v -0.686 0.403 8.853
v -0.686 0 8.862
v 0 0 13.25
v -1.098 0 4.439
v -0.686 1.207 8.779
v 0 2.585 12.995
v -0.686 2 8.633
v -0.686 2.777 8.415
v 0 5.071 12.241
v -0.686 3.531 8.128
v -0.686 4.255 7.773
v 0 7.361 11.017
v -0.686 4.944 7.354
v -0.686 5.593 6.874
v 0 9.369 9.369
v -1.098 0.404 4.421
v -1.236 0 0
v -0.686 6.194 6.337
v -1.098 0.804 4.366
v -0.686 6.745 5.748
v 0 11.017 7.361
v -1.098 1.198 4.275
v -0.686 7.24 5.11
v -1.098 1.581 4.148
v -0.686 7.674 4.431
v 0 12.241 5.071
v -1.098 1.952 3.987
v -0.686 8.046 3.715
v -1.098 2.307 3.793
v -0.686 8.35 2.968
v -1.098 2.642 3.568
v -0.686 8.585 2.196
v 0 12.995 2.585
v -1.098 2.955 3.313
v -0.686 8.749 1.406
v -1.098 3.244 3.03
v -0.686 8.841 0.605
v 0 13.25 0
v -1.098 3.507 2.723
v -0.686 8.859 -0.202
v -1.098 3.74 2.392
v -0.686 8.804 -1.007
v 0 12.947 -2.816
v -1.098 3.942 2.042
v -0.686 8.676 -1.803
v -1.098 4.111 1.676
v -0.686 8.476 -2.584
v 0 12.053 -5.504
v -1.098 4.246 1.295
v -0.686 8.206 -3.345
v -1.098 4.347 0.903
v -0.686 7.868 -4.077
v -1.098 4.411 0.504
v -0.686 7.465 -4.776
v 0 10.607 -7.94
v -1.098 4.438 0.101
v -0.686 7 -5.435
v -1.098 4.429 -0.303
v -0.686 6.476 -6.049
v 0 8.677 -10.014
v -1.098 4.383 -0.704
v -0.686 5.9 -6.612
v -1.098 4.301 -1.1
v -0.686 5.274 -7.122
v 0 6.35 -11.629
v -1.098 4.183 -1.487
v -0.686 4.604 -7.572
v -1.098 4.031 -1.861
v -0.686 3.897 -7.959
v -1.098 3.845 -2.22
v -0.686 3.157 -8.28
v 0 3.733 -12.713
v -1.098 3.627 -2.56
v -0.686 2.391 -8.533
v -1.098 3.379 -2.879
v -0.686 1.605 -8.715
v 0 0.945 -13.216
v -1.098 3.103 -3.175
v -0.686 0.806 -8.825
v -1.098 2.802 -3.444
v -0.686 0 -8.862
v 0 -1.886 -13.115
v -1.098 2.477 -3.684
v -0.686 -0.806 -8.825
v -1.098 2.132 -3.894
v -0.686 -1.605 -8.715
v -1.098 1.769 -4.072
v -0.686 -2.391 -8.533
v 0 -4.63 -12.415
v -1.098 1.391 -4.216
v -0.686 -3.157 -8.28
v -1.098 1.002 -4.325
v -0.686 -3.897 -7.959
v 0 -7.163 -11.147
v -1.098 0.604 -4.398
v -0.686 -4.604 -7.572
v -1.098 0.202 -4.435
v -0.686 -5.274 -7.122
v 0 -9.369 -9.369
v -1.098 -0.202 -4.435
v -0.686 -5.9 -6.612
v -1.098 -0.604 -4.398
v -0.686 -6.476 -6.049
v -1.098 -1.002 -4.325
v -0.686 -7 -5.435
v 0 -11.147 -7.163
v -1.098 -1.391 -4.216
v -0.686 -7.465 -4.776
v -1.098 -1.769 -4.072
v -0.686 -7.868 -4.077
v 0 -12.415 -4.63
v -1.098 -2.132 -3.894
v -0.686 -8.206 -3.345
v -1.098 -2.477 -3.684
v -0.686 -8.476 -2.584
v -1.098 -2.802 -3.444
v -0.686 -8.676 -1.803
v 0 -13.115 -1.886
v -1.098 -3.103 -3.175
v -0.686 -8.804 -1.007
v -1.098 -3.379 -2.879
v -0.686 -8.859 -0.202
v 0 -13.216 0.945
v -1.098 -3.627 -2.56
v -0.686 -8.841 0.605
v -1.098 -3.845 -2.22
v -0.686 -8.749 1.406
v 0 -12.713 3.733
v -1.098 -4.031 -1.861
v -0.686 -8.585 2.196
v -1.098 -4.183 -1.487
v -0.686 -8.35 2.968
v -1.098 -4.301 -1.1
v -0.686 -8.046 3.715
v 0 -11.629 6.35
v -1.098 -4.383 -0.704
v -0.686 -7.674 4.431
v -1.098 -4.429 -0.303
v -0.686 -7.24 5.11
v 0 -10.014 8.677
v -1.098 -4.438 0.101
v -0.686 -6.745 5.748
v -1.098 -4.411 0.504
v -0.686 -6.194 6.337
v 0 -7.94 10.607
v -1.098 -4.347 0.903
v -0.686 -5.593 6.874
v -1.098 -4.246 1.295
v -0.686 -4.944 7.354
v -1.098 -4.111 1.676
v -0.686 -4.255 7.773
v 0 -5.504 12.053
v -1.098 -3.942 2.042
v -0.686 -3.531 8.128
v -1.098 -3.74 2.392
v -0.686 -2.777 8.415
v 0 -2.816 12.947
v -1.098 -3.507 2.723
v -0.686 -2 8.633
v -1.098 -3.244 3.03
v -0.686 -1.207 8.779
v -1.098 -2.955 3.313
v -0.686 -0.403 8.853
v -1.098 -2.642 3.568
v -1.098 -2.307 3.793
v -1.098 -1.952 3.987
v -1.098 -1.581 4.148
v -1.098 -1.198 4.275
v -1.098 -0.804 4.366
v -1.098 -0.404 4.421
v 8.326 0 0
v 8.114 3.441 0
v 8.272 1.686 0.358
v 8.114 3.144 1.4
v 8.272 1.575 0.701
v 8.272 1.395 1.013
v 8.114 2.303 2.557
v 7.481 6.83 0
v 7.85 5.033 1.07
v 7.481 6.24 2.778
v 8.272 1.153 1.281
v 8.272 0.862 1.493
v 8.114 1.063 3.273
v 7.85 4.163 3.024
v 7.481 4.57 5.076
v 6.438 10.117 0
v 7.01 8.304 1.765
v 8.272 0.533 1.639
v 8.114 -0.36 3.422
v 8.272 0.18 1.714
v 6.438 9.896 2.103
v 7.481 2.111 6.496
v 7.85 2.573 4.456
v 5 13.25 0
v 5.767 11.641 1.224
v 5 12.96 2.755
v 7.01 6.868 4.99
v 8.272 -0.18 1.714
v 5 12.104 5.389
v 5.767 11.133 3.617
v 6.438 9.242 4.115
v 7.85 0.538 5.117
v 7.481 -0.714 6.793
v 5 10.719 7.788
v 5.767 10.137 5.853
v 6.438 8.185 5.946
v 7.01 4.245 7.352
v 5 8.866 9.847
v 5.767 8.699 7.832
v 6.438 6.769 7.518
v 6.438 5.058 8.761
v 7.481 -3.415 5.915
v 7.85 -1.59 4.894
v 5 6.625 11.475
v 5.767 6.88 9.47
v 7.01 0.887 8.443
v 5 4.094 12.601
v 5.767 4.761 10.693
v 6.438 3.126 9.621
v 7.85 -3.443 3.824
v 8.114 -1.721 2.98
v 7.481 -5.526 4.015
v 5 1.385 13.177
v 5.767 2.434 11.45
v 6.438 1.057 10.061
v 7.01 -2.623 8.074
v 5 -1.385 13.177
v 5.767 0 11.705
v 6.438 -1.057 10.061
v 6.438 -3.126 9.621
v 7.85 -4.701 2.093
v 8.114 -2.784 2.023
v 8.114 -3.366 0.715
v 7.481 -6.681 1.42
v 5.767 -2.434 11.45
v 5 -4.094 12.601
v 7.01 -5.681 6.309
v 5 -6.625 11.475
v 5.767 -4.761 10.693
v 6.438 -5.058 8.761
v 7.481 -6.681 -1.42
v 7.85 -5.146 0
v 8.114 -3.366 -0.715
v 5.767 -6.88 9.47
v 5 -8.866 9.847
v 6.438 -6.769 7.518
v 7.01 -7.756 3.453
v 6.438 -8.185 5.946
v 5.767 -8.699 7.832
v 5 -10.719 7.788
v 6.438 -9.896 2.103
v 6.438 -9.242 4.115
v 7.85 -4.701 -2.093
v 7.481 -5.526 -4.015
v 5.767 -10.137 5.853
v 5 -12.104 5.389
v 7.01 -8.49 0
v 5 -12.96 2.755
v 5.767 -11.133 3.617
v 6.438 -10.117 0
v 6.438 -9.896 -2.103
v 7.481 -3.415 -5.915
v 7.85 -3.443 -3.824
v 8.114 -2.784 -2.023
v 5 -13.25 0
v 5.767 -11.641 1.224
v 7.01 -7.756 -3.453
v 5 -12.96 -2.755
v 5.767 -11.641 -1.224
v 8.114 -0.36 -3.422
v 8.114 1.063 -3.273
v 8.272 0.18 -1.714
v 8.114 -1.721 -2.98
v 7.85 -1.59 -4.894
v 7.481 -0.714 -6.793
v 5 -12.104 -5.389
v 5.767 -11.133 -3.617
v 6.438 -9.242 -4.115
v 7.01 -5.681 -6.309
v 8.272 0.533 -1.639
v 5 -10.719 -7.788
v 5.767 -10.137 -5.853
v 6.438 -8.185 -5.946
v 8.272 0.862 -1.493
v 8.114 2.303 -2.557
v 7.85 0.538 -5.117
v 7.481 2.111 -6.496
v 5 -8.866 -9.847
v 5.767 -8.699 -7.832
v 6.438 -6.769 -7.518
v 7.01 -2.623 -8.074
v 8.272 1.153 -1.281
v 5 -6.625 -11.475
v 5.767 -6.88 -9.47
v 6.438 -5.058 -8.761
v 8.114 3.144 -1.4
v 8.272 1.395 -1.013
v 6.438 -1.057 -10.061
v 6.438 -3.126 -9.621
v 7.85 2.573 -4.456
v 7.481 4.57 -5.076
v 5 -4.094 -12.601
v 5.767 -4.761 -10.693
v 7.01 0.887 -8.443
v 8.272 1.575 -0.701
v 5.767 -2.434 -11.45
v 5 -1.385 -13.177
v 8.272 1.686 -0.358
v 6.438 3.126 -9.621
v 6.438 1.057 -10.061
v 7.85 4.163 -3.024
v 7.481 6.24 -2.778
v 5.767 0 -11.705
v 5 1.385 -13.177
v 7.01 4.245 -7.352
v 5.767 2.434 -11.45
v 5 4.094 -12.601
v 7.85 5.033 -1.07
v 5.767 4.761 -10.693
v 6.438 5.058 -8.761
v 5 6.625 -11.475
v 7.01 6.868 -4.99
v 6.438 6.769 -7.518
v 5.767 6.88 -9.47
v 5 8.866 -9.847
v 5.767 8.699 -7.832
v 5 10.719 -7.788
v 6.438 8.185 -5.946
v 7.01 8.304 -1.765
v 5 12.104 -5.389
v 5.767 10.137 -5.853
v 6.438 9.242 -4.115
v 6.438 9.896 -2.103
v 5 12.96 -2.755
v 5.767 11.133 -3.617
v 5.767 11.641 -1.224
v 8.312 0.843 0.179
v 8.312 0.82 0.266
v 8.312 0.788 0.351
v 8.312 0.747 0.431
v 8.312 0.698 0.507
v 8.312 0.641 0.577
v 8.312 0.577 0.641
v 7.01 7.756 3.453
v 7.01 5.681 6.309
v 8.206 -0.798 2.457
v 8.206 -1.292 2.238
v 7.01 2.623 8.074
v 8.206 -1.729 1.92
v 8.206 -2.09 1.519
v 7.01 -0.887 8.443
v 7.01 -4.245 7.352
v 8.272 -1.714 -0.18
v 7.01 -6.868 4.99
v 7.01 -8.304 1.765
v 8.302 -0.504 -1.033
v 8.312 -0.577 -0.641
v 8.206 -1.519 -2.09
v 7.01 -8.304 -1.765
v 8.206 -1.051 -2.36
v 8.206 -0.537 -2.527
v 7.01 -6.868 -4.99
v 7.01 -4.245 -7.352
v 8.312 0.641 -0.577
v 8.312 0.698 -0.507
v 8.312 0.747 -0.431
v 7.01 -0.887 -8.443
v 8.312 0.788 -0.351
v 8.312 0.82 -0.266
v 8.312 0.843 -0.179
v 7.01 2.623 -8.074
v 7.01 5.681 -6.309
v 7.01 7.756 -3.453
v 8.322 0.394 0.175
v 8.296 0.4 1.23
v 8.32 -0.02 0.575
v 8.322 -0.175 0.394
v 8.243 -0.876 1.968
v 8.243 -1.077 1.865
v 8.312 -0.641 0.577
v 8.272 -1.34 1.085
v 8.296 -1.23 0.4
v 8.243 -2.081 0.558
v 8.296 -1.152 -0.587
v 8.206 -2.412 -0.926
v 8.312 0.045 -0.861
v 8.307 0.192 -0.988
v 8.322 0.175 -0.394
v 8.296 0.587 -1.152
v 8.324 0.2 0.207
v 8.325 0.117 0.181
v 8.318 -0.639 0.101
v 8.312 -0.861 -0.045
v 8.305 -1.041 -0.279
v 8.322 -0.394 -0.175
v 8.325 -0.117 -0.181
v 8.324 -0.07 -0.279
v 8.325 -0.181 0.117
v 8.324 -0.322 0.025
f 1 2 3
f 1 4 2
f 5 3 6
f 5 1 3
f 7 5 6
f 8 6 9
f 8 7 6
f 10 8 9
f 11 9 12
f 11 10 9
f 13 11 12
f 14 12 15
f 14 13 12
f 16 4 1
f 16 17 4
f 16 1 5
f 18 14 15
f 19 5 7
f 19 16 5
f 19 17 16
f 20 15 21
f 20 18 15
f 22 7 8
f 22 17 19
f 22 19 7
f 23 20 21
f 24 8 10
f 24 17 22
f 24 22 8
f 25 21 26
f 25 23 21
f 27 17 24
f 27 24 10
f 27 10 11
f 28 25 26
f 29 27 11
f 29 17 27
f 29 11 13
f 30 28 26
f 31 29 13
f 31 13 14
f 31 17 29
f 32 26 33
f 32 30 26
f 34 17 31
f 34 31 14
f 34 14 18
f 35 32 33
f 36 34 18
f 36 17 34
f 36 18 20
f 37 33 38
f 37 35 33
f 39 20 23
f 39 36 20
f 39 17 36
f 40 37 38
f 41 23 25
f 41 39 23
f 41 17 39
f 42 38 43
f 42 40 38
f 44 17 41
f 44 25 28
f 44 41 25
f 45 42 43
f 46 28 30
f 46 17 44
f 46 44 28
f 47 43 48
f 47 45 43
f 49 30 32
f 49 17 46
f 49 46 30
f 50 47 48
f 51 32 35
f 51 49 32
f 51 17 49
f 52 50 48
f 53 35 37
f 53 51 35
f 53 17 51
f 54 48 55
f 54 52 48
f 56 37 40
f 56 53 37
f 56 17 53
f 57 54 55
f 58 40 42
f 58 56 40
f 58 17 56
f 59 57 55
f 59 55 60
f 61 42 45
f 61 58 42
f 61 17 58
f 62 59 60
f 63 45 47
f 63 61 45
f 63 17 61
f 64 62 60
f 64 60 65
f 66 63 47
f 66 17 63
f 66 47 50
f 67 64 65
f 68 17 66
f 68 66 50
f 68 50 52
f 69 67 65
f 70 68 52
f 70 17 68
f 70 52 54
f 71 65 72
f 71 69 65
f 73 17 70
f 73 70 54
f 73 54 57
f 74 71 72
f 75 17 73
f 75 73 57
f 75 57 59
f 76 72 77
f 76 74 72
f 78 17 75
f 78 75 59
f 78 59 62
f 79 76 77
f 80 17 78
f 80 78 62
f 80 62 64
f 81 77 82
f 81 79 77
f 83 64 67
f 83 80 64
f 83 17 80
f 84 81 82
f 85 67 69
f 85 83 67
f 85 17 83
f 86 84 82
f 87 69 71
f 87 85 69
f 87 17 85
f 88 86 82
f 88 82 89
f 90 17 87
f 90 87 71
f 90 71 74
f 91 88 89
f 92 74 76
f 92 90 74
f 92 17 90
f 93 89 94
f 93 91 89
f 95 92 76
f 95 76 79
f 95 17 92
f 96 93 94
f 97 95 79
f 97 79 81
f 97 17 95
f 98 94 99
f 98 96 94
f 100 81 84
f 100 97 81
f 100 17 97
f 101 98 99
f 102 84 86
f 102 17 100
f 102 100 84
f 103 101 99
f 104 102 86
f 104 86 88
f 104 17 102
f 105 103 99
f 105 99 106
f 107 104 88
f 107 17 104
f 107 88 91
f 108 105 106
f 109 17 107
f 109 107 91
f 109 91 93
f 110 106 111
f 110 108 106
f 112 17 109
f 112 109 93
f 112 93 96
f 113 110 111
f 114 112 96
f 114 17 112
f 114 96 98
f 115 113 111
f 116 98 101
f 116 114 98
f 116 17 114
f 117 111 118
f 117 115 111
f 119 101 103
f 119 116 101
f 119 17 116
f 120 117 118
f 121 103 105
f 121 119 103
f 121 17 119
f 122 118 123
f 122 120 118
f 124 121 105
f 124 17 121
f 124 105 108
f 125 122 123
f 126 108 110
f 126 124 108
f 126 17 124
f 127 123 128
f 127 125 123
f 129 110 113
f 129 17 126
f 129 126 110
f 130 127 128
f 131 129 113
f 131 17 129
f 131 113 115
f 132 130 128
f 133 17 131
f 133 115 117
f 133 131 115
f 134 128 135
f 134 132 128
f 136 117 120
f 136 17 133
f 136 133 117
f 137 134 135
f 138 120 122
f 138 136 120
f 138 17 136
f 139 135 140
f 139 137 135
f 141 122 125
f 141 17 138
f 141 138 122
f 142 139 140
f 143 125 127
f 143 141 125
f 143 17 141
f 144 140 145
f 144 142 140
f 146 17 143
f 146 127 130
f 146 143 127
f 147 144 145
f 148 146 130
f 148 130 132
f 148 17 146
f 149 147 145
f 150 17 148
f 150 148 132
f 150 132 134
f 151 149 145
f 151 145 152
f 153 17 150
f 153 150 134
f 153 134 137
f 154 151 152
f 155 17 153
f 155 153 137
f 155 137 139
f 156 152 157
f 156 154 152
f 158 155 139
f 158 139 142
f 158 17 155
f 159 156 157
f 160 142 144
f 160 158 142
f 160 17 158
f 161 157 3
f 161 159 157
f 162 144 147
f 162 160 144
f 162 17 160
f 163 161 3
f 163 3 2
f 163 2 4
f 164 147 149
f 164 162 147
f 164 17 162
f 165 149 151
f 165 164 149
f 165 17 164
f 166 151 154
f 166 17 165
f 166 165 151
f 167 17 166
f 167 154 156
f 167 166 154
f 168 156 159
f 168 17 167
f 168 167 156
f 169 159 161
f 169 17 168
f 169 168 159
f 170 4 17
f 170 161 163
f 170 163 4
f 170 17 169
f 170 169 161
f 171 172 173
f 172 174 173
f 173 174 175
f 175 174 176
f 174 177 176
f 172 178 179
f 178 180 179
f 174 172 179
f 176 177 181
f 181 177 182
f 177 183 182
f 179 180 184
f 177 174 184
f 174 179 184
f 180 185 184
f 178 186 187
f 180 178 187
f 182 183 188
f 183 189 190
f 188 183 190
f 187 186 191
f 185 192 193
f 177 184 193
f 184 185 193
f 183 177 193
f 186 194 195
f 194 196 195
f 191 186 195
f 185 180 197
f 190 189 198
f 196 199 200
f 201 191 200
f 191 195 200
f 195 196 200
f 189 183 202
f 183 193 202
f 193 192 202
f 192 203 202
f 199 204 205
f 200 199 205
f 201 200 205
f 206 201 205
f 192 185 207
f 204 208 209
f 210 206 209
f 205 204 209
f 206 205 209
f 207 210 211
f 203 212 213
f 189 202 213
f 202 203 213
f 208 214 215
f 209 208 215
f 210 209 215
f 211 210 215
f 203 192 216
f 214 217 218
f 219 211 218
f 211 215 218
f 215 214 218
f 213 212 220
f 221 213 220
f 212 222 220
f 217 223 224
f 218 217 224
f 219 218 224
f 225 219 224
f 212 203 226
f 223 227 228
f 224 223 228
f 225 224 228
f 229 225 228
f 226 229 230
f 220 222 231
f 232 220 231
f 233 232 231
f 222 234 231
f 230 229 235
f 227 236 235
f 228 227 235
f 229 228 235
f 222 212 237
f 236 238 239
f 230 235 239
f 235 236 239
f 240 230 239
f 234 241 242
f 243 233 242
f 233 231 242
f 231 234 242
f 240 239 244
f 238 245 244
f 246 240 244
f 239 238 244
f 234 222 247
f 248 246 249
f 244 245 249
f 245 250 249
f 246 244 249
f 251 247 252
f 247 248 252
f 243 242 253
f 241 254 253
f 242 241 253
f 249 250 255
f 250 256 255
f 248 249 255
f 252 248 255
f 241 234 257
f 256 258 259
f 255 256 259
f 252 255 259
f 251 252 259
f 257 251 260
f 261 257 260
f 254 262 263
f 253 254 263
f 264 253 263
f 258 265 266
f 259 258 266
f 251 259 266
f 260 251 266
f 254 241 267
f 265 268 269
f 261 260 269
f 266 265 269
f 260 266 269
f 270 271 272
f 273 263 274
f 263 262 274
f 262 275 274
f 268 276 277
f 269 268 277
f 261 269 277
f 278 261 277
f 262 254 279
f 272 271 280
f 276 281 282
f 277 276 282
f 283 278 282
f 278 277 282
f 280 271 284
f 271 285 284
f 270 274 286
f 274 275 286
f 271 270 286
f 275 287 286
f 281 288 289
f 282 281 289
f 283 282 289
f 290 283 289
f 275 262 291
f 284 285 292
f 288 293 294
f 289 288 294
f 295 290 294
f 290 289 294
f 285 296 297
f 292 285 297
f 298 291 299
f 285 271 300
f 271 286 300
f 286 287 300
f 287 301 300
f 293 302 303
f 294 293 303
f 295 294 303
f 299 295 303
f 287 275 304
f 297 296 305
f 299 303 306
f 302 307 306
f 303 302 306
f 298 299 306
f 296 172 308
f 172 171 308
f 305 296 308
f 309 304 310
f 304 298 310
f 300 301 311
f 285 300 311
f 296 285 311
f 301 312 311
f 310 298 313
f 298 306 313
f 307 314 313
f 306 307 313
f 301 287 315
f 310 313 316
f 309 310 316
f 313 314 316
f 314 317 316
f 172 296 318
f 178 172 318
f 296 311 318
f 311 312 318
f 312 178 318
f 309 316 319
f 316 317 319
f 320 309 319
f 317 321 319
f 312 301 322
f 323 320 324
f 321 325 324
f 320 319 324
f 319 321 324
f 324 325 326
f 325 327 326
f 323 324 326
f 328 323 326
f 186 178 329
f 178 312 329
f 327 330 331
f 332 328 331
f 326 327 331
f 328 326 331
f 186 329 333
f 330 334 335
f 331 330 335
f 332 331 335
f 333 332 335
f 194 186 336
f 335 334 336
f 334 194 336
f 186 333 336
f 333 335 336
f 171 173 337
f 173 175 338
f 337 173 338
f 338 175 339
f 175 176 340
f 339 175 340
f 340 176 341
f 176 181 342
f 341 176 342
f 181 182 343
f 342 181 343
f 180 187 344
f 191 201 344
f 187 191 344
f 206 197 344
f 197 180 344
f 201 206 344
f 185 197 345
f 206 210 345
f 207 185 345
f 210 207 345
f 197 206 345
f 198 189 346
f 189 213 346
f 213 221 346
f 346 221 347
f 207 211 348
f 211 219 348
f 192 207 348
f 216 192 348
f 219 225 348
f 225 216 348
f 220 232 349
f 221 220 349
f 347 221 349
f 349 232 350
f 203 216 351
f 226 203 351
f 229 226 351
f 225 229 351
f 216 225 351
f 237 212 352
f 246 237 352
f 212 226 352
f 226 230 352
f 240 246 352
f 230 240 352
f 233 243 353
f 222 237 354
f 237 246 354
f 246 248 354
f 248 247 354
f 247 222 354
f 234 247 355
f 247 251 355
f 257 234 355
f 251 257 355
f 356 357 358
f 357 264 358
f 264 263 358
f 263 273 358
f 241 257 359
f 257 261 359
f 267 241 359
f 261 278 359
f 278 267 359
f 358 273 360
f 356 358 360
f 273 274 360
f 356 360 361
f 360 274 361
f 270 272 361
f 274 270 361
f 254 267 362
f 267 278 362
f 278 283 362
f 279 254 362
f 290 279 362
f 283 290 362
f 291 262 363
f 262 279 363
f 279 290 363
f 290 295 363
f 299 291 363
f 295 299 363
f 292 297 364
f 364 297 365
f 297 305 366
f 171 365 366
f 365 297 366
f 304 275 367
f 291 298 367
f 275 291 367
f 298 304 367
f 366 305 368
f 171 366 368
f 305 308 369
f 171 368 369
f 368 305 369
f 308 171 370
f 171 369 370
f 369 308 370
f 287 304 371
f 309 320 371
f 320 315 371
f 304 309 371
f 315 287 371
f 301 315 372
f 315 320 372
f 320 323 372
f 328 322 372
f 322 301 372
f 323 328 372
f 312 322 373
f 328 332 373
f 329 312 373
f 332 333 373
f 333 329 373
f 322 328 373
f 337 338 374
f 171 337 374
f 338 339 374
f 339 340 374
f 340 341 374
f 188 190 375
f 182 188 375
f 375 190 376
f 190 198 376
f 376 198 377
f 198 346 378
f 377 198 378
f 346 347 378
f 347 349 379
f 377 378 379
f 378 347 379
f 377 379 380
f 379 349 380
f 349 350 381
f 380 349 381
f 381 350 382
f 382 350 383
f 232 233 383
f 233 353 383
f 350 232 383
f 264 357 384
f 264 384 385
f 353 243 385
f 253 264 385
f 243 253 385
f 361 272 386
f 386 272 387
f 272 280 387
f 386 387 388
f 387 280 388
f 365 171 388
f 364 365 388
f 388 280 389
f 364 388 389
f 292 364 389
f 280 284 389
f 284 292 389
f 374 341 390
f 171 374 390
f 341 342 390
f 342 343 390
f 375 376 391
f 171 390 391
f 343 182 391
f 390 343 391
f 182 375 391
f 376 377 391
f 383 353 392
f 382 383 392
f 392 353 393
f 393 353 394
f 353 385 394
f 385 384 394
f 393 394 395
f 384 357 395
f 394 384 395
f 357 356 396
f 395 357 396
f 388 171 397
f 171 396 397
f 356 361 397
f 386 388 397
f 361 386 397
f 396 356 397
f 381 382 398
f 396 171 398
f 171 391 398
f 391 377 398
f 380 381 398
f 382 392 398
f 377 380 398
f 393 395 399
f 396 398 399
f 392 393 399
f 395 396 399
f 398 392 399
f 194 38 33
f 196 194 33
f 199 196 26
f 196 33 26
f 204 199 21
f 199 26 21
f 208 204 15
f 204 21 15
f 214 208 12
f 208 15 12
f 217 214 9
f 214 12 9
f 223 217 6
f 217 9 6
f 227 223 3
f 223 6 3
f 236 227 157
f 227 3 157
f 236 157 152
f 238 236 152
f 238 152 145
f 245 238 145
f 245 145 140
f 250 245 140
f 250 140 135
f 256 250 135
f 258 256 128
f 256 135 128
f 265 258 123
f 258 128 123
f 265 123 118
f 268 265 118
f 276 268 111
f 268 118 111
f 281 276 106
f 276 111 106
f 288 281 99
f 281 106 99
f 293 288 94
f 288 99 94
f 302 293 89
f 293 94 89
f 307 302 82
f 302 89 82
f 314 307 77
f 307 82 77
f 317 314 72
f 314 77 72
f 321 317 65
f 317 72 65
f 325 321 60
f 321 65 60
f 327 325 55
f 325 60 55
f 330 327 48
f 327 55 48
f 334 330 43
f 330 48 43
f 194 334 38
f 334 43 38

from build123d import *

# Parameters (mm, degrees)
F0_R     = 13.25
F1_DEPTH = 5


with BuildPart() as f1:
    # F0 (on Right) → F1 (new body)
    with BuildSketch(Plane.YZ):
        Circle(F0_R)
    extrude(amount=F1_DEPTH)

    # F2 (on Top) → F4 (revolve)
    with BuildSketch(Plane.XY):
        with BuildLine():
            ThreePointArc((8.325502, 0), (7.481431, 6.830473), (5, 13.25))
            Line((5, 13.25), (5, 0))
            Line((5, 0), (8.325502, 0))
        make_face()
    revolve(axis=Axis((5.30408, 0, 0), (1, 0, 0)))

    # F5 (on Front) → F6 (revolve)
    with BuildSketch(Plane.XZ):
        with BuildLine():
            Line((-1.236098, 0), (0, 0))
            Line((0, 0), (0, 13.25))
            ThreePointArc((0, 13.25), (-0.926404, 6.653767), (-1.236098, 0))
        make_face()
    revolve(axis=Axis((-0.618049, 0, 0), (-1, 0, 0)))


solid = f1.part
